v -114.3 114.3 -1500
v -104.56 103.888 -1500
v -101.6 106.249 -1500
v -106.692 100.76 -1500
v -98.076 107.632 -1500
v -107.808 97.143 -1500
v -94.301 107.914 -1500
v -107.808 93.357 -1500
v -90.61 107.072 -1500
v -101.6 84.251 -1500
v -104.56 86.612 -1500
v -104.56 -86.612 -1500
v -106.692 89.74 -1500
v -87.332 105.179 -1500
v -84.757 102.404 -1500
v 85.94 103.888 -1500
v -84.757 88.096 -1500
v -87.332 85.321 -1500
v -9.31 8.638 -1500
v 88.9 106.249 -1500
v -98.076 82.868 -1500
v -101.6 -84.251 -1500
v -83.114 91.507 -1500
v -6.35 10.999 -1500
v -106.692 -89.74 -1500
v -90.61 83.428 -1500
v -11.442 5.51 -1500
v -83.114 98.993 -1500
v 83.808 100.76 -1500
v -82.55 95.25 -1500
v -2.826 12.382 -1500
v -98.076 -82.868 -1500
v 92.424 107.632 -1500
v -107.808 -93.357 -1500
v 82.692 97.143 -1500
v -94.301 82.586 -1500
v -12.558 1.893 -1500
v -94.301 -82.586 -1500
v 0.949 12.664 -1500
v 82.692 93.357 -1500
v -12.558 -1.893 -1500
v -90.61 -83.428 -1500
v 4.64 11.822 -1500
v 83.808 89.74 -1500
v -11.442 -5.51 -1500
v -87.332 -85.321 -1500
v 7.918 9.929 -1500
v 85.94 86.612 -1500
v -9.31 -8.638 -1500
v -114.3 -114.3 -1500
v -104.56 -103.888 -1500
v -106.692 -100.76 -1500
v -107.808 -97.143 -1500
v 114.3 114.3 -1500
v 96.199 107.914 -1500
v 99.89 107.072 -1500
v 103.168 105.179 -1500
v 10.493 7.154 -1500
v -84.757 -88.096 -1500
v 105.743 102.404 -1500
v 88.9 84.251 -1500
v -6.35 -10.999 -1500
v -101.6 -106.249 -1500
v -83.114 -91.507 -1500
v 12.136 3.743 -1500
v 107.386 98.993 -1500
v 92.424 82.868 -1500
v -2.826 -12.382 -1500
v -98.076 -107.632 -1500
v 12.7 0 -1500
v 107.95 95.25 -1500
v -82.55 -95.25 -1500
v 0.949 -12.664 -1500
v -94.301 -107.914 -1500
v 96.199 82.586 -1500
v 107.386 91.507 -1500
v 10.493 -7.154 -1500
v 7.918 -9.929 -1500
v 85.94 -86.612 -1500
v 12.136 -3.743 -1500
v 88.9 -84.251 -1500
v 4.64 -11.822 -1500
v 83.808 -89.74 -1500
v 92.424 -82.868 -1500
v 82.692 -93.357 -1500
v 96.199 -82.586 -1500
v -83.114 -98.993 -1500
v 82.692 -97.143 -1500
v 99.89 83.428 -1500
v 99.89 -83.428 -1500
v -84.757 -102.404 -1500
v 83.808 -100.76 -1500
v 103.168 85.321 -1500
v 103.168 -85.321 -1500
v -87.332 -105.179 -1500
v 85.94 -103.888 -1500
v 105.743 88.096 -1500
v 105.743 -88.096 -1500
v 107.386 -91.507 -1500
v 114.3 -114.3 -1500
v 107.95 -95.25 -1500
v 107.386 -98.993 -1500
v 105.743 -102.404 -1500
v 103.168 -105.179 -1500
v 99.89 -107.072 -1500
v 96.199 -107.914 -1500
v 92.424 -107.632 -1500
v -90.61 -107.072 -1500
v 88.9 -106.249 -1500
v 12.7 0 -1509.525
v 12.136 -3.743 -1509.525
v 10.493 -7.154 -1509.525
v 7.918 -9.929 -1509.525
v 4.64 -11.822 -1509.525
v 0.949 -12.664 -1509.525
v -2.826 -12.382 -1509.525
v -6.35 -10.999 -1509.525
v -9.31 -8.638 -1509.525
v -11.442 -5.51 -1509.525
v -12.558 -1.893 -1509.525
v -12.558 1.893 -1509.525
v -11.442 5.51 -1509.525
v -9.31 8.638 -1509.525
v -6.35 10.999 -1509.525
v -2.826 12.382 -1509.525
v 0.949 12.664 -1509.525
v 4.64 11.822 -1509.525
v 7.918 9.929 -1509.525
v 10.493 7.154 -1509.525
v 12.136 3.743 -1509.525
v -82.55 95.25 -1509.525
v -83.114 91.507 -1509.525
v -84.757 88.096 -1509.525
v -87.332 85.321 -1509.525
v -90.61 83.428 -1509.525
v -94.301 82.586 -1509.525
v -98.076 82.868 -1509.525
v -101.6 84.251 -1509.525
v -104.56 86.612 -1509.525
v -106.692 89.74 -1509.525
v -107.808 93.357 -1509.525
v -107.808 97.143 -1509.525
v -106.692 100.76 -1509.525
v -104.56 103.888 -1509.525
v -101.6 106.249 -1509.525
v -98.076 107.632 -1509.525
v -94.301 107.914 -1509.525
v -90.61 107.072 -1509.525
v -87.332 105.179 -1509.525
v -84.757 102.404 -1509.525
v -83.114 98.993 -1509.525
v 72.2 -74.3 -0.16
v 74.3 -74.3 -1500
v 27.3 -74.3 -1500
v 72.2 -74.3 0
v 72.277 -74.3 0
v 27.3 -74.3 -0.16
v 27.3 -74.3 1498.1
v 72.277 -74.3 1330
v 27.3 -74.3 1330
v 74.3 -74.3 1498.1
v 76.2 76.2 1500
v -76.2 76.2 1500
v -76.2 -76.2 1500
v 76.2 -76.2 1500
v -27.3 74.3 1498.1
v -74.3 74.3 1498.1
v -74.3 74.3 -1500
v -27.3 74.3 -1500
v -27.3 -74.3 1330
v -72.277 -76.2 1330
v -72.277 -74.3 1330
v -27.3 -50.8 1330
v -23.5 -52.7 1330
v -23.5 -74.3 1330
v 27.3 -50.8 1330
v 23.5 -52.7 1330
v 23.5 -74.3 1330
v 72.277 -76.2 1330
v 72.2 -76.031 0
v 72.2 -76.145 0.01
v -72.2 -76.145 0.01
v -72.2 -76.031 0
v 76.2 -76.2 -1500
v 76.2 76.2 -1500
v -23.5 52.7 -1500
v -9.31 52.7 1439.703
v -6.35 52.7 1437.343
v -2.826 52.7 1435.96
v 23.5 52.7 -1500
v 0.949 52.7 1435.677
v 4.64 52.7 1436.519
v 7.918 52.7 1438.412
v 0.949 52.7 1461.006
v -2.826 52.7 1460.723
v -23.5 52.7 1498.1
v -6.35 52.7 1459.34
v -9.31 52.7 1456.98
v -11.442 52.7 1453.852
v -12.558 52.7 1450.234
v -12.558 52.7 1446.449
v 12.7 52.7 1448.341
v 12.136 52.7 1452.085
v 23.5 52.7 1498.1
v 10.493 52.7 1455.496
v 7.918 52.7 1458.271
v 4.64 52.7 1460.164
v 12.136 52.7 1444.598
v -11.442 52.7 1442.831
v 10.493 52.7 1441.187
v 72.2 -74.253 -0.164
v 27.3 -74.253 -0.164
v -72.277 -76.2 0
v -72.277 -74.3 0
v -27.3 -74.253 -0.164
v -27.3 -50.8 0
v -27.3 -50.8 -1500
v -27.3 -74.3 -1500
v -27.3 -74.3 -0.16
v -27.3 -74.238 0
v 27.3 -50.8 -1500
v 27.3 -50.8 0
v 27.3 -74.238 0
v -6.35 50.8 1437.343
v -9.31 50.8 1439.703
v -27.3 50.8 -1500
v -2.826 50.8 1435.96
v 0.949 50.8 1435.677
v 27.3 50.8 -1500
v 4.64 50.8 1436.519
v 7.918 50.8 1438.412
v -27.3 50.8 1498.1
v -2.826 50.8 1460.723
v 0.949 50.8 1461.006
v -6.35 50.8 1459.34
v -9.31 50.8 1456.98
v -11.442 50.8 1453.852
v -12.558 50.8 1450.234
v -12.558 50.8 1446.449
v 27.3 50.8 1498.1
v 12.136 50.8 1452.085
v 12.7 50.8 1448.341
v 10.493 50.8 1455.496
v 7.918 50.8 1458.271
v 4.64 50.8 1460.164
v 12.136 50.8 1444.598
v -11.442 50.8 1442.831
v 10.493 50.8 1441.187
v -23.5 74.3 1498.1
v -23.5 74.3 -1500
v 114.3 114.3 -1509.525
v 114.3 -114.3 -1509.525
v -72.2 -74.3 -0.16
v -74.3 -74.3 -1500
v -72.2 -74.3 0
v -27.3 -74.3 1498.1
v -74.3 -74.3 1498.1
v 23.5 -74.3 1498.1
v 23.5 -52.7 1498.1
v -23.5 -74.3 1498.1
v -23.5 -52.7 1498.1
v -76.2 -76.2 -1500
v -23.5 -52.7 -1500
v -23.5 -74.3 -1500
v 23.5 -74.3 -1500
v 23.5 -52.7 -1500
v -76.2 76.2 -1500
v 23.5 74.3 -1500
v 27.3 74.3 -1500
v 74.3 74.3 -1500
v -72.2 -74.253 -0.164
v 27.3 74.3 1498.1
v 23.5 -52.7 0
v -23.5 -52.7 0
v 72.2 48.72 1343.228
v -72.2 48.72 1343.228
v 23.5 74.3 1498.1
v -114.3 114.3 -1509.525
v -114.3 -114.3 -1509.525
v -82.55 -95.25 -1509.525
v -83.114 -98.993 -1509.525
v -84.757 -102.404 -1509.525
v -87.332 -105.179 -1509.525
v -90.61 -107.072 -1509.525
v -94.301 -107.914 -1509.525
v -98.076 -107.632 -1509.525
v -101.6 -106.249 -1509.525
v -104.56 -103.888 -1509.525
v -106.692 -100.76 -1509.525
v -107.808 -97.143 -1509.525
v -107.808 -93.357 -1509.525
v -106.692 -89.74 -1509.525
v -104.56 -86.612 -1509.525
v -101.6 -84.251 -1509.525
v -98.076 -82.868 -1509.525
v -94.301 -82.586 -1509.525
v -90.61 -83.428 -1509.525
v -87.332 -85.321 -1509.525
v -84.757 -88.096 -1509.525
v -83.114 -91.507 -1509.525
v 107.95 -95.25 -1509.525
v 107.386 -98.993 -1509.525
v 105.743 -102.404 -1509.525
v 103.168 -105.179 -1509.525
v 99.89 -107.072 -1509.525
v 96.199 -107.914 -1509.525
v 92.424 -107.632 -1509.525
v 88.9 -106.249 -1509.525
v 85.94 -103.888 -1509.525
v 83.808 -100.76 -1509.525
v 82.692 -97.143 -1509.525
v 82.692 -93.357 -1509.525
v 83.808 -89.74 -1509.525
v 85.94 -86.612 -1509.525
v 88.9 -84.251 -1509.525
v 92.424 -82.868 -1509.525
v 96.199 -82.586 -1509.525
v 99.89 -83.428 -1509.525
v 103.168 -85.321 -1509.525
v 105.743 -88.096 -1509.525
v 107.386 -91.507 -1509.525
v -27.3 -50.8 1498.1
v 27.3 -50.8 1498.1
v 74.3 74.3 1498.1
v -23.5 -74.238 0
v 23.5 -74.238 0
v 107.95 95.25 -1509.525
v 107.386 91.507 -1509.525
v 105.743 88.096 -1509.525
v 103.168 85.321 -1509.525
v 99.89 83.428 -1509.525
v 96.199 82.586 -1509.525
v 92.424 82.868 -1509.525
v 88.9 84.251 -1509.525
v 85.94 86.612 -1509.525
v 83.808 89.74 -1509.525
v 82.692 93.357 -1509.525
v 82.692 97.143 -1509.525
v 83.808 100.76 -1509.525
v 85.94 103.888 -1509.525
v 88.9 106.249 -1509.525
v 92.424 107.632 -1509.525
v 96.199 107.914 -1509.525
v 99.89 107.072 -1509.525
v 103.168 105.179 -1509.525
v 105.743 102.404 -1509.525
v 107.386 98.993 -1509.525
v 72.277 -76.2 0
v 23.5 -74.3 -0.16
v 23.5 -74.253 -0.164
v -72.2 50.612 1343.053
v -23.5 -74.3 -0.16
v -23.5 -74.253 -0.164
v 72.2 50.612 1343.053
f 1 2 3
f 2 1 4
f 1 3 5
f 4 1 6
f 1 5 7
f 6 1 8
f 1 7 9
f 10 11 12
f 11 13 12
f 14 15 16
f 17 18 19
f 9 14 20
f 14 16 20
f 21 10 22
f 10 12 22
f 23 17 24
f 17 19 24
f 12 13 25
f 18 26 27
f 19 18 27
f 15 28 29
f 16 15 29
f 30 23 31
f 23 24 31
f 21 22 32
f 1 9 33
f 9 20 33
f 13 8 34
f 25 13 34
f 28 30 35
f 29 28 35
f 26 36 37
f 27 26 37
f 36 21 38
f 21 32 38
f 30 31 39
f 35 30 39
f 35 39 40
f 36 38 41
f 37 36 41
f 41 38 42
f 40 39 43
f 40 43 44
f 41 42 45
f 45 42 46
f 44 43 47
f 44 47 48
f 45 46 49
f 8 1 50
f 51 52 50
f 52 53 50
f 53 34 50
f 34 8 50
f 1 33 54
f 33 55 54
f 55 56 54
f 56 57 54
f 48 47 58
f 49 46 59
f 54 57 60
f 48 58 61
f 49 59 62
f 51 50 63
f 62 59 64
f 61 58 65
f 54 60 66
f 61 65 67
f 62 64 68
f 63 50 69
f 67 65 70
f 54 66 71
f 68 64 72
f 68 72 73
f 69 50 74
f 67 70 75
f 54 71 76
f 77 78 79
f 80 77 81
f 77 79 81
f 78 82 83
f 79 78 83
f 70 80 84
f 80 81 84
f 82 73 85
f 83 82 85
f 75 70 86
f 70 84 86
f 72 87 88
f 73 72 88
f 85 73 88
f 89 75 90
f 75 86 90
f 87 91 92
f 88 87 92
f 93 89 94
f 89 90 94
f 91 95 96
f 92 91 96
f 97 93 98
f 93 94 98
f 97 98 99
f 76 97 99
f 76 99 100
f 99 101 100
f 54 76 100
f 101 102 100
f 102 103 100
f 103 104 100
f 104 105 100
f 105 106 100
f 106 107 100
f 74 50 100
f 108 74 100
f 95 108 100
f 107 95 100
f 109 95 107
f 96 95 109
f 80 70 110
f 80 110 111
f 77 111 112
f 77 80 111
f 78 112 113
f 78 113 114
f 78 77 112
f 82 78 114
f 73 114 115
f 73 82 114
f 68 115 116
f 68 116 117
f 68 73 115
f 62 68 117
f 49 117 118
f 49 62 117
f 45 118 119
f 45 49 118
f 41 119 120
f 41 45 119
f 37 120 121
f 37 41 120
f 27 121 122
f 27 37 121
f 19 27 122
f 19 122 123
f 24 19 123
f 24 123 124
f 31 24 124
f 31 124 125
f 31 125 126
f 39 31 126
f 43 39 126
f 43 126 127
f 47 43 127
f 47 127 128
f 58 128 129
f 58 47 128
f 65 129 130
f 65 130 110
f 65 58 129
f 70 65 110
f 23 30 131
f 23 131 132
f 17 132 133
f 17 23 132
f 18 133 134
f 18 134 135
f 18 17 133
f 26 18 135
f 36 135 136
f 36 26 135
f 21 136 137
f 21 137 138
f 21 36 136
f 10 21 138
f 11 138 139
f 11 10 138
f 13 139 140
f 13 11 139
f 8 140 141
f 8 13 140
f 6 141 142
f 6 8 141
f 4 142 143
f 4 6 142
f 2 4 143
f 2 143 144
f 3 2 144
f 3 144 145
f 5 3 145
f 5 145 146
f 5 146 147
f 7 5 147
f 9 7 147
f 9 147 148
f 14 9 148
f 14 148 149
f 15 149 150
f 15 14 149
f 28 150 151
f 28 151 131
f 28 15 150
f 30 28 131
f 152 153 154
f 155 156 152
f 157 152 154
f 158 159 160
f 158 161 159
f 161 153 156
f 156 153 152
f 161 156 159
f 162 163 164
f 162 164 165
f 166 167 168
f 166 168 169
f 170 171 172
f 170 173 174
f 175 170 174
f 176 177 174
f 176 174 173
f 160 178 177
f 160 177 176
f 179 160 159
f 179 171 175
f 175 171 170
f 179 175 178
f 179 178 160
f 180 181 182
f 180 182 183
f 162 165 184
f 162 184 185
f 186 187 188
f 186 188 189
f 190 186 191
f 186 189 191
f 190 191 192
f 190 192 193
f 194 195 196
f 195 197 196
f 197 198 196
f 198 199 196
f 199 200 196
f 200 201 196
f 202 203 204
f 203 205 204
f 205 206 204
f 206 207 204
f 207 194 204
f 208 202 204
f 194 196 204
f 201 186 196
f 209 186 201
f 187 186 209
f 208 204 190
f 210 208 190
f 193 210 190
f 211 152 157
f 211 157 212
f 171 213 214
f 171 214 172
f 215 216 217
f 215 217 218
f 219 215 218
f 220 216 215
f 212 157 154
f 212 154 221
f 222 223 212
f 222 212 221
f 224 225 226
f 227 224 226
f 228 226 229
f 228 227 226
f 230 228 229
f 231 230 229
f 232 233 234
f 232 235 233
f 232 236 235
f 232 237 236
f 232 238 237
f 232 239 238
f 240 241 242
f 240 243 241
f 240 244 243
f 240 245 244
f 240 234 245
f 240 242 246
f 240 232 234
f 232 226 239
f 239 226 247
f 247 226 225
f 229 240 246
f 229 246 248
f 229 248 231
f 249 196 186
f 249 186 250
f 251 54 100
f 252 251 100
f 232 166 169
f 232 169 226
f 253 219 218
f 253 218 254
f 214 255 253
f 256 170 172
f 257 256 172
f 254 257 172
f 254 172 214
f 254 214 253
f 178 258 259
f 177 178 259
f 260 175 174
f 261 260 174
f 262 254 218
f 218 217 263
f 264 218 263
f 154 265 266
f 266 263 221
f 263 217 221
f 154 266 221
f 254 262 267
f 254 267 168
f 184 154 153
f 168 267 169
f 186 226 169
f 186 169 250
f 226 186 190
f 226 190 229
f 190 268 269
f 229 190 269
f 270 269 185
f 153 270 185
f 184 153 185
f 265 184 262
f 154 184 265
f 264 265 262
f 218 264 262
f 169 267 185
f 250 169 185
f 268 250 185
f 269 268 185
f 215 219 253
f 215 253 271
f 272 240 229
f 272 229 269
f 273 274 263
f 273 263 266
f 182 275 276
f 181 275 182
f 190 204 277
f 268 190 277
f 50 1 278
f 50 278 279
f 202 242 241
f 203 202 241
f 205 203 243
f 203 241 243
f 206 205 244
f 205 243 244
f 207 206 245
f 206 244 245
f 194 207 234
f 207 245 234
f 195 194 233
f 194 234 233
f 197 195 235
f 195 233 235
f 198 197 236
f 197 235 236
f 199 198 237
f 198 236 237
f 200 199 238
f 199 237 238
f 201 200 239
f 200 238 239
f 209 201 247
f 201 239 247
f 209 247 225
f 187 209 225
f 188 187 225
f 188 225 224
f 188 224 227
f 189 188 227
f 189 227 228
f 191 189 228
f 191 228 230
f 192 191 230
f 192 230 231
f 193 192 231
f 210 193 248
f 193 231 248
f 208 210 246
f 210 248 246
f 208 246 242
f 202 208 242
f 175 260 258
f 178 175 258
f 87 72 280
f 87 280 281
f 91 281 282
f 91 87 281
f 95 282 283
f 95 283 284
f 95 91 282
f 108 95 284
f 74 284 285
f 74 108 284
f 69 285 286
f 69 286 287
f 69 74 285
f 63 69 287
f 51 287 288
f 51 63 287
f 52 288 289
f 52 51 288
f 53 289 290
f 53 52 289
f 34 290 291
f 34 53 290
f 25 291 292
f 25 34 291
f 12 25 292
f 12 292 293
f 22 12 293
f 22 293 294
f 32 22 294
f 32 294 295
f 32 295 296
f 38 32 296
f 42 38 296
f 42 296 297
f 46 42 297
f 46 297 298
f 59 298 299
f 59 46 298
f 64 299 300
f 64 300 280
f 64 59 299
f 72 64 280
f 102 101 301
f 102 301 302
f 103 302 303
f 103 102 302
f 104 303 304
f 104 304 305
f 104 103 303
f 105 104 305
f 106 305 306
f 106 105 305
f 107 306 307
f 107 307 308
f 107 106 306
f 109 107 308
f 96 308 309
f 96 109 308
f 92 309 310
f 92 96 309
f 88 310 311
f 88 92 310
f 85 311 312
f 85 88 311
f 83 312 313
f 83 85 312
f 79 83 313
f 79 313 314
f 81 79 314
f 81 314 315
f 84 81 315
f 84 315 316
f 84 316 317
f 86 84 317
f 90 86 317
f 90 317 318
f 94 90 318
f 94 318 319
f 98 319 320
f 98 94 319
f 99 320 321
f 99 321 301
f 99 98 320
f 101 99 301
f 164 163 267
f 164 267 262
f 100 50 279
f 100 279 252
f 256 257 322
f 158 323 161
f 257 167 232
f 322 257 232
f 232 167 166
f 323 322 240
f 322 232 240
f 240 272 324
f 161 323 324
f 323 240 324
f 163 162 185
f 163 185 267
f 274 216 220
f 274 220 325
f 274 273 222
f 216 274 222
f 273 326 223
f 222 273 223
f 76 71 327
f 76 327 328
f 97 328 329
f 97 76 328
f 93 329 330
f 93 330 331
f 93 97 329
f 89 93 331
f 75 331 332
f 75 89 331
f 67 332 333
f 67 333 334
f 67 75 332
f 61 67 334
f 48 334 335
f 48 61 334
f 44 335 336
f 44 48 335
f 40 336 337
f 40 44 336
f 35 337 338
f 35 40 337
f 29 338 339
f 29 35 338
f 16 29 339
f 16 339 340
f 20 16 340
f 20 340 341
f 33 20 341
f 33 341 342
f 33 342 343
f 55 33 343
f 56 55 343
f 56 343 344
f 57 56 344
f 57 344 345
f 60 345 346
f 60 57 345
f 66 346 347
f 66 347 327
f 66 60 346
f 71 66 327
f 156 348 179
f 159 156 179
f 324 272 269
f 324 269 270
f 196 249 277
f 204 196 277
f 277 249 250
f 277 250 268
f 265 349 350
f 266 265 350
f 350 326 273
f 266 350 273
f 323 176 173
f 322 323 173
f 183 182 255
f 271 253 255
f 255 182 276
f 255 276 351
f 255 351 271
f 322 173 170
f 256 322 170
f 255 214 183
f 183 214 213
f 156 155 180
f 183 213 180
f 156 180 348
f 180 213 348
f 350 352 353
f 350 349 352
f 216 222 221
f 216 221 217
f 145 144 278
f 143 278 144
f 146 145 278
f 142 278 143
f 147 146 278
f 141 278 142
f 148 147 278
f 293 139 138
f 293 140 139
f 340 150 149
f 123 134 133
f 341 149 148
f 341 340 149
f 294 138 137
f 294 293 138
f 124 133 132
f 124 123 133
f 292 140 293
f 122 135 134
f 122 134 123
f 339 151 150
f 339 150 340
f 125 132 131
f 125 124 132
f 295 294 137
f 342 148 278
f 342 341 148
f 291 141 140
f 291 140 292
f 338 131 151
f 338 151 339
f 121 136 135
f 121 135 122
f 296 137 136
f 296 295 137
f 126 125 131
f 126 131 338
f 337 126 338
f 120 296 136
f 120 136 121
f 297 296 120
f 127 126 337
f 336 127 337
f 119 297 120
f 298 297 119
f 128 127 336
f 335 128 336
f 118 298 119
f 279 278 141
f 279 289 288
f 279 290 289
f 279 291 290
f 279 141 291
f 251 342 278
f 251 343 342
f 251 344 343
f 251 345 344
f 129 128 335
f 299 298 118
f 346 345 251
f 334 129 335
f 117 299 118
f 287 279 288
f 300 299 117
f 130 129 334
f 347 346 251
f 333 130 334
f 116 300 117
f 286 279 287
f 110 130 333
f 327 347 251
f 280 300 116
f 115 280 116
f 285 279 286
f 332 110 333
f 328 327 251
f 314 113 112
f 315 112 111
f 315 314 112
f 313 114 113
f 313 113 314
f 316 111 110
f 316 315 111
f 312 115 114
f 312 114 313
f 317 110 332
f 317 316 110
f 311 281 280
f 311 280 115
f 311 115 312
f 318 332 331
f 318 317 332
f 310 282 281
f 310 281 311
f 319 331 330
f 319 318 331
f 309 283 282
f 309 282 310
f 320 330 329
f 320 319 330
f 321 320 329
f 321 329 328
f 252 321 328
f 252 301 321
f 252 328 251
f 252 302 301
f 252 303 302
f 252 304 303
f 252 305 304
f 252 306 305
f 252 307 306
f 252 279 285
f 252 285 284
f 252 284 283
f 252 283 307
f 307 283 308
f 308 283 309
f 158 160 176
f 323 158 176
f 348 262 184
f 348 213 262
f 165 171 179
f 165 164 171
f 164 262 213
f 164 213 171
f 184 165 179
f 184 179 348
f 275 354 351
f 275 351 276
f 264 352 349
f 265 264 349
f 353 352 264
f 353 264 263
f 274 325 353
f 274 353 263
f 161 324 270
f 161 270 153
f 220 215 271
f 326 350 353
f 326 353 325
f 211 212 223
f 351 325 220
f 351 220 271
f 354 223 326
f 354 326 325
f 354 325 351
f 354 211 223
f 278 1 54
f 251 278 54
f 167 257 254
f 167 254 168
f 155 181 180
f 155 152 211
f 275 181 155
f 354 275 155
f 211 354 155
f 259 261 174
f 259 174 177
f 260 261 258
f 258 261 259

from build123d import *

# Parameters (mm, degrees)
F0_W      = 50.8
F0_H      = 25.4
F0_W_2    = 47
F0_H_2    = 21.6
F1_DEPTH  = 1500
F2_W      = 228.6
F2_H      = 228.6
F2_R      = 12.7
F3_DEPTH  = 9.525
F4_W      = 144.553527236
F4_H      = 1330
F5_DEPTH  = 81
F6_W      = 152.4
F6_H      = 152.4
F7_DEPTH  = 1.9
F9_DEPTH  = 72.2
F10_R     = 12.7
F11_DEPTH = 1.9


# Not quite as in the source:
# - a length typed as a fraction of an inch, garbled in the dataset ("3 / 203.2 mm" for 3/8 in), is restored


with BuildPart() as f1:
    # F0 (on Top) → F1 (new body, symmetric)
    with BuildSketch(Plane.XY):
        with Locations((0, -63.5)):
            Rectangle(F0_W, F0_H)
        with Locations((0, -63.5)):
            Rectangle(F0_W_2, F0_H_2, mode=Mode.SUBTRACT)
        with Locations((0, 63.5)):
            Rectangle(F0_W, F0_H)
        with Locations((0, 63.5)):
            Rectangle(F0_W_2, F0_H_2, mode=Mode.SUBTRACT)
        Polygon((-25.4, 76.2), (-76.2, 76.2), (-76.2, -76.2), (-25.4, -76.2), (-25.4, -50.8), (-27.3, -50.8), (-27.3, -74.3), (-74.3, -74.3), (-74.3, 74.3), (-27.3, 74.3), (-27.3, 50.8), (-25.4, 50.8), align=None)
        Polygon((76.2, 76.2), (25.4, 76.2), (25.4, 50.8), (27.3, 50.8), (27.3, 74.3), (74.3, 74.3), (74.3, -74.3), (27.3, -74.3), (27.3, -50.8), (25.4, -50.8), (25.4, -76.2), (76.2, -76.2), align=None)
    extrude(amount=F1_DEPTH, both=True)

    # F4 (on face) → F5 (cut)
    with BuildSketch(Plane.XZ.offset(76.2)):
        with Locations((0, 665)):
            Rectangle(F4_W, F4_H)
    extrude(amount=-F5_DEPTH, mode=Mode.SUBTRACT)

    # F6 (on face) → F7 (join)
    with BuildSketch(Plane.XY.offset(1500)):
        Rectangle(F6_W, F6_H)
    extrude(amount=-F7_DEPTH)

    # F8 (on Right) → F9 (join, symmetric)
    with BuildSketch(Plane.YZ):
        Polygon((-76.1449276874, 0.0104757039), (-74.2529536564, -0.1639841968), (50.611830749, 1343.0530421202), (48.719856718, 1343.2275020208), align=None)
    extrude(amount=F9_DEPTH, both=True)

    # F10 (on face) → F11 (cut, through all)
    with BuildSketch(Plane.XZ.offset(-50.8)):
        with Locations((0, 1448.3414888382)):
            Circle(F10_R)
    extrude(amount=-F11_DEPTH, mode=Mode.SUBTRACT)


with BuildPart() as f3:
    # F2 (on face) → F3 (new body)
    with BuildSketch(Plane(origin=(0, 0, -1500), x_dir=(1, 0, 0), z_dir=(0, 0, -1))):
        Rectangle(F2_W, F2_H)
        with Locations((-95.25, -95.25)):
            Circle(F2_R, mode=Mode.SUBTRACT)
        with Locations((95.25, -95.25)):
            Circle(F2_R, mode=Mode.SUBTRACT)
        with Locations((-95.25, 95.25)):
            Circle(F2_R, mode=Mode.SUBTRACT)
        Circle(F2_R, mode=Mode.SUBTRACT)
        with Locations((95.25, 95.25)):
            Circle(F2_R, mode=Mode.SUBTRACT)
    extrude(amount=F3_DEPTH)


solid = Compound([f1.part, f3.part])
